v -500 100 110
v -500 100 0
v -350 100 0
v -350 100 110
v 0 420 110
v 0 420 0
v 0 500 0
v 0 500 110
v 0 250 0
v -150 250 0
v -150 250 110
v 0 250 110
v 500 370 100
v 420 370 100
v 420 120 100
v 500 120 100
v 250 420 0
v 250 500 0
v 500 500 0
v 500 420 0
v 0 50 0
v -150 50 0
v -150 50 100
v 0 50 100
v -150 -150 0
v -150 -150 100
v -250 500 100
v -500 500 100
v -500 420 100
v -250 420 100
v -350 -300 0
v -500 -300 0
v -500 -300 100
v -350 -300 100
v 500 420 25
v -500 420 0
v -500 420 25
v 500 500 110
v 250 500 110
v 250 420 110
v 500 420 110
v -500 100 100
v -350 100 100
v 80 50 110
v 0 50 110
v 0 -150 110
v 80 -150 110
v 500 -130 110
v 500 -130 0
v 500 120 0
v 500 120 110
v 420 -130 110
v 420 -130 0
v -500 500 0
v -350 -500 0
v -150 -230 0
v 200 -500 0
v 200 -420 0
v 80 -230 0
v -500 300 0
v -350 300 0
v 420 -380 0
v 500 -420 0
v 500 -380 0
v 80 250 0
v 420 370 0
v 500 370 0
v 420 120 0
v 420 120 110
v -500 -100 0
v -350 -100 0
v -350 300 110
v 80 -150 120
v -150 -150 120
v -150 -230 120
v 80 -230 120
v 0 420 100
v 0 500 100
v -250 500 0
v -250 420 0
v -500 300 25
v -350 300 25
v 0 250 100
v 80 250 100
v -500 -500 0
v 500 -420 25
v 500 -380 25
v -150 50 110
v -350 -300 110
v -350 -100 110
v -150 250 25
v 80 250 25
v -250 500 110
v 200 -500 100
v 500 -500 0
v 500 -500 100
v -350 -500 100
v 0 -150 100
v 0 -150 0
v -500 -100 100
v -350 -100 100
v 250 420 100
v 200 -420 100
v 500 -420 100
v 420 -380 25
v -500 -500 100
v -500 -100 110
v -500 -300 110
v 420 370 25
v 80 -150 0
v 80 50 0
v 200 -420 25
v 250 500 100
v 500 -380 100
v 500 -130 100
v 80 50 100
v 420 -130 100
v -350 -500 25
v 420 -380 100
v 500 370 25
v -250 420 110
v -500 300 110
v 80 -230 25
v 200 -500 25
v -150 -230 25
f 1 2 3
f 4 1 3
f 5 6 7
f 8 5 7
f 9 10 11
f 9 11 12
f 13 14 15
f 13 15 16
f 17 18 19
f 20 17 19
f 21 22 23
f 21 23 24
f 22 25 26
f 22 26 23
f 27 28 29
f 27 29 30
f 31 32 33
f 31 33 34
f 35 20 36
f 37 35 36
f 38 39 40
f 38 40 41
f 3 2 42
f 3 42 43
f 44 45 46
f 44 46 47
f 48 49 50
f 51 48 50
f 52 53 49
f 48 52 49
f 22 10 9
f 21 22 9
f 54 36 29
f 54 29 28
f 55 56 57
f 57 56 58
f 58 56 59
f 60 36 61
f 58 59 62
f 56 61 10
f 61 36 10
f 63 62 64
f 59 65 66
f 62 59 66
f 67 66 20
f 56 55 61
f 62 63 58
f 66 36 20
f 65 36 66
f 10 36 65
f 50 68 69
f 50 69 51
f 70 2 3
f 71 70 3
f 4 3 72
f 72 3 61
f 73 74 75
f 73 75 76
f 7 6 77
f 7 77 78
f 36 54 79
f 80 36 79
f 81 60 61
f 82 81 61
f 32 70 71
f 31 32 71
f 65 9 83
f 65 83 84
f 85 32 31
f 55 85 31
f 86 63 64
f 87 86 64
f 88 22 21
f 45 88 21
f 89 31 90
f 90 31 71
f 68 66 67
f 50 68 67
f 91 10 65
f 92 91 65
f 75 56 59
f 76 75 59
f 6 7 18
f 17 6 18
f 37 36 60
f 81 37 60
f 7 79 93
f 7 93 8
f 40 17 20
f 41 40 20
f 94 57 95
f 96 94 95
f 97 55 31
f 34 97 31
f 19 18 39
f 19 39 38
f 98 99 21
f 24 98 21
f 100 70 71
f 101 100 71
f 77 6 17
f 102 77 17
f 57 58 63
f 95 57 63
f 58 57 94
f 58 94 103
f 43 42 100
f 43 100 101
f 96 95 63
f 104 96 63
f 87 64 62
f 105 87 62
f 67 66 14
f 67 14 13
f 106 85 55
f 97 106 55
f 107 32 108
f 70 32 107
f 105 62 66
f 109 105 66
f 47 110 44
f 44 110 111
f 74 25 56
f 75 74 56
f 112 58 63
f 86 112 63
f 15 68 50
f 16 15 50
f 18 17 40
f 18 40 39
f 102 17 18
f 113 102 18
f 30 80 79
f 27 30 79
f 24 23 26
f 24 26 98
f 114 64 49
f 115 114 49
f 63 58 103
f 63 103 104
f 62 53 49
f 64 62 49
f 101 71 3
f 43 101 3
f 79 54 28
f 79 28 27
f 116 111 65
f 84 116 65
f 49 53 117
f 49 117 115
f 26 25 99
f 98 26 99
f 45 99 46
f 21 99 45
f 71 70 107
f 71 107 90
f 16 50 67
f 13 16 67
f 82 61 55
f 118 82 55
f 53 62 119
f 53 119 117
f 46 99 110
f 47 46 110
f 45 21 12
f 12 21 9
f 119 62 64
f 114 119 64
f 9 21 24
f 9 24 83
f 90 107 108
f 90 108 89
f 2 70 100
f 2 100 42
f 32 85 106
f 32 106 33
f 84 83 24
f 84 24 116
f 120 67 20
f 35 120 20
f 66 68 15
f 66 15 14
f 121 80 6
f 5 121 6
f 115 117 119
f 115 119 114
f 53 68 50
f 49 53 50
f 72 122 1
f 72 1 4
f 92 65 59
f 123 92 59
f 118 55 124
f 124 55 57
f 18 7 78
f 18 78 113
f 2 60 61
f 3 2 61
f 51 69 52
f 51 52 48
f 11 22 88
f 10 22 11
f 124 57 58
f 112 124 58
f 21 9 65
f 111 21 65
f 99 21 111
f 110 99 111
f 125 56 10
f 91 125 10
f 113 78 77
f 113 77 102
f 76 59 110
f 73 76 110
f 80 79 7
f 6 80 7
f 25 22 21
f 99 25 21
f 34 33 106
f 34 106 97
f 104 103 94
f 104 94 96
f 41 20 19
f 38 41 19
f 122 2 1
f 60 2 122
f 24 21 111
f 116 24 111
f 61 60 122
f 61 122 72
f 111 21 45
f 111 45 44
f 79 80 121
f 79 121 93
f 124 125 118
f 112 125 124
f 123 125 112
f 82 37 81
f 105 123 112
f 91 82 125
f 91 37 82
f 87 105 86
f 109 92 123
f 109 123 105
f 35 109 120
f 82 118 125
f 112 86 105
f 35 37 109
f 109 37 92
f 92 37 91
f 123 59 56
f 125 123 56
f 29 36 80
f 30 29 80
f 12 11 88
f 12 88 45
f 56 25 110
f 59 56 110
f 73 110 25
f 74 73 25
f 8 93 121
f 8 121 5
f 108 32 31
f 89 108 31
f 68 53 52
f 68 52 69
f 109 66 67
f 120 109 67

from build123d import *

# Parameters (mm, degrees)
F0_W     = 250
F0_H     = 80
F0_W_2   = 80
F0_H_2   = 250
F0_W_3   = 300
F0_W_4   = 150
F0_H_3   = 200
F1_DEPTH = 100
F2_DEPTH = 110
F3_DEPTH = 120
F4_DEPTH = 25


with BuildPart() as f1:
    # F0 (on Top) → F1 (new body)
    with BuildSketch(Plane.XY):
        with Locations((-375, 460)):
            Rectangle(F0_W, F0_H)
        with Locations((125, 460)):
            Rectangle(F0_W, F0_H)
        with Locations((460, 245)):
            Rectangle(F0_W_2, F0_H_2)
        with Locations((460, -255)):
            Rectangle(F0_W_2, F0_H_2)
        with Locations((350, -460)):
            Rectangle(F0_W_3, F0_H)
        with Locations((-425, -400)):
            Rectangle(F0_W_4, F0_H_3)
        with Locations((-425, 0)):
            Rectangle(F0_W_4, F0_H_3)
        with Locations((-75, -50)):
            Rectangle(F0_W_4, F0_H_3)
        with Locations((40, 150)):
            Rectangle(F0_W_2, F0_H_3)
    extrude(amount=F1_DEPTH)


with BuildPart() as f2:
    # F0 (on Top) → F2 (new body)
    with BuildSketch(Plane.XY):
        with Locations((-425, 200)):
            Rectangle(F0_W_4, F0_H_3)
        with Locations((-125, 460)):
            Rectangle(F0_W, F0_H)
        with Locations((375, 460)):
            Rectangle(F0_W, F0_H)
        with Locations((460, -5)):
            Rectangle(F0_W_2, F0_H_2)
        with Locations((-75, 150)):
            Rectangle(F0_W_4, F0_H_3)
        with Locations((40, -50)):
            Rectangle(F0_W_2, F0_H_3)
        with Locations((-425, -200)):
            Rectangle(F0_W_4, F0_H_3)
    extrude(amount=F2_DEPTH)


with BuildPart() as f3:
    # F0 (on Top) → F3 (new body)
    with BuildSketch(Plane.XY):
        Polygon((80, -150), (0, -150), (-150, -150), (-150, -230), (80, -230), align=None)
    extrude(amount=F3_DEPTH)


with BuildPart() as f4:
    # F0 (on Top) → F4 (new body)
    with BuildSketch(Plane.XY):
        Polygon((-250, 420), (-500, 420), (-500, 300), (-350, 300), (-350, 100), (-350, -100), (-350, -300), (-350, -500), (200, -500), (200, -420), (500, -420), (500, -380), (420, -380), (420, -130), (420, 120), (420, 370), (500, 370), (500, 420), (250, 420), (0, 420), align=None)
        Polygon((-150, 250), (0, 250), (80, 250), (80, 50), (80, -150), (80, -230), (-150, -230), (-150, -150), (-150, 50), align=None, mode=Mode.SUBTRACT)
    extrude(amount=F4_DEPTH)


solid = Compound([f1.part, f2.part, f3.part, f4.part])
